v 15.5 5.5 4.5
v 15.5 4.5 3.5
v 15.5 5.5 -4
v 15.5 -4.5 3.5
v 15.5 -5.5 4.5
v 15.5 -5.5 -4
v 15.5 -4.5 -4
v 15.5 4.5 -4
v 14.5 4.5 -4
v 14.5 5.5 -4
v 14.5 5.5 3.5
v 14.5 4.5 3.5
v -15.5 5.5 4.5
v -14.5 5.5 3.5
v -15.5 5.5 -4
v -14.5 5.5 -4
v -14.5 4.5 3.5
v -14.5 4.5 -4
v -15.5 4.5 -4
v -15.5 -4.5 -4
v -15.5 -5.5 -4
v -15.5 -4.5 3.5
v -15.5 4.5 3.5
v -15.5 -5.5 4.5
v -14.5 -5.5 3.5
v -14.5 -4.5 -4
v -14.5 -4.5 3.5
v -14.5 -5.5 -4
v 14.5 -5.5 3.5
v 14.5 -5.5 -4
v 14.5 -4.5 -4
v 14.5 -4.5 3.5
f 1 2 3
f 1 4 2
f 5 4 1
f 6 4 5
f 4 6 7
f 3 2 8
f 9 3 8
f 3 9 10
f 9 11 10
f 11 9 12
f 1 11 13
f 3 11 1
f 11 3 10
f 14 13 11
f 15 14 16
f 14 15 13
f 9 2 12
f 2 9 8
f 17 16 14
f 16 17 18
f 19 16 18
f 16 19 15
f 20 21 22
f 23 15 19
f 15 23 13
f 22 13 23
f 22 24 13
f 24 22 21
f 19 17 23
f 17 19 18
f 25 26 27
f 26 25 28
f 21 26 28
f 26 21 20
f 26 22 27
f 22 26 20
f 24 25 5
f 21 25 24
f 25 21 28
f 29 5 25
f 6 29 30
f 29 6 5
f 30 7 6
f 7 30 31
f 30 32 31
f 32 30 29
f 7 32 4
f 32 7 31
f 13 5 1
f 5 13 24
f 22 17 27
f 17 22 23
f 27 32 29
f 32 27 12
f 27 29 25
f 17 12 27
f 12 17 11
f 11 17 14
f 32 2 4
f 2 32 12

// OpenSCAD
// Angelo Nicolì 2023 - Licensed GPL-2.0

Table_Leg = [1,1,8];


Leg_Distance_x = 30;
Leg_Distance_y = 10;


color("#cdaa7d"){
translate([Leg_Distance_x*0.5,Leg_Distance_y*0.5,0])
cube([Table_Leg[0],Table_Leg[1],Table_Leg[2]],center=true);

translate([-Leg_Distance_x*0.5,Leg_Distance_y*0.5,0])
cube([Table_Leg[0],Table_Leg[1],Table_Leg[2]],center=true);

translate([-Leg_Distance_x*0.5,-Leg_Distance_y*0.5,0])
cube([Table_Leg[0],Table_Leg[1],Table_Leg[2]],center=true);

translate([Leg_Distance_x*0.5,-Leg_Distance_y*0.5,0])
cube([Table_Leg[0],Table_Leg[1],Table_Leg[2]],center=true);

Table_Upper = [Leg_Distance_x+Table_Leg[0],Leg_Distance_y+Table_Leg[1],1];
Table_Height = Table_Leg[2]*0.5;

translate([0,0,Table_Height])
cube([Table_Upper[0],Table_Upper[1],Table_Upper[2]],center=true);
}
